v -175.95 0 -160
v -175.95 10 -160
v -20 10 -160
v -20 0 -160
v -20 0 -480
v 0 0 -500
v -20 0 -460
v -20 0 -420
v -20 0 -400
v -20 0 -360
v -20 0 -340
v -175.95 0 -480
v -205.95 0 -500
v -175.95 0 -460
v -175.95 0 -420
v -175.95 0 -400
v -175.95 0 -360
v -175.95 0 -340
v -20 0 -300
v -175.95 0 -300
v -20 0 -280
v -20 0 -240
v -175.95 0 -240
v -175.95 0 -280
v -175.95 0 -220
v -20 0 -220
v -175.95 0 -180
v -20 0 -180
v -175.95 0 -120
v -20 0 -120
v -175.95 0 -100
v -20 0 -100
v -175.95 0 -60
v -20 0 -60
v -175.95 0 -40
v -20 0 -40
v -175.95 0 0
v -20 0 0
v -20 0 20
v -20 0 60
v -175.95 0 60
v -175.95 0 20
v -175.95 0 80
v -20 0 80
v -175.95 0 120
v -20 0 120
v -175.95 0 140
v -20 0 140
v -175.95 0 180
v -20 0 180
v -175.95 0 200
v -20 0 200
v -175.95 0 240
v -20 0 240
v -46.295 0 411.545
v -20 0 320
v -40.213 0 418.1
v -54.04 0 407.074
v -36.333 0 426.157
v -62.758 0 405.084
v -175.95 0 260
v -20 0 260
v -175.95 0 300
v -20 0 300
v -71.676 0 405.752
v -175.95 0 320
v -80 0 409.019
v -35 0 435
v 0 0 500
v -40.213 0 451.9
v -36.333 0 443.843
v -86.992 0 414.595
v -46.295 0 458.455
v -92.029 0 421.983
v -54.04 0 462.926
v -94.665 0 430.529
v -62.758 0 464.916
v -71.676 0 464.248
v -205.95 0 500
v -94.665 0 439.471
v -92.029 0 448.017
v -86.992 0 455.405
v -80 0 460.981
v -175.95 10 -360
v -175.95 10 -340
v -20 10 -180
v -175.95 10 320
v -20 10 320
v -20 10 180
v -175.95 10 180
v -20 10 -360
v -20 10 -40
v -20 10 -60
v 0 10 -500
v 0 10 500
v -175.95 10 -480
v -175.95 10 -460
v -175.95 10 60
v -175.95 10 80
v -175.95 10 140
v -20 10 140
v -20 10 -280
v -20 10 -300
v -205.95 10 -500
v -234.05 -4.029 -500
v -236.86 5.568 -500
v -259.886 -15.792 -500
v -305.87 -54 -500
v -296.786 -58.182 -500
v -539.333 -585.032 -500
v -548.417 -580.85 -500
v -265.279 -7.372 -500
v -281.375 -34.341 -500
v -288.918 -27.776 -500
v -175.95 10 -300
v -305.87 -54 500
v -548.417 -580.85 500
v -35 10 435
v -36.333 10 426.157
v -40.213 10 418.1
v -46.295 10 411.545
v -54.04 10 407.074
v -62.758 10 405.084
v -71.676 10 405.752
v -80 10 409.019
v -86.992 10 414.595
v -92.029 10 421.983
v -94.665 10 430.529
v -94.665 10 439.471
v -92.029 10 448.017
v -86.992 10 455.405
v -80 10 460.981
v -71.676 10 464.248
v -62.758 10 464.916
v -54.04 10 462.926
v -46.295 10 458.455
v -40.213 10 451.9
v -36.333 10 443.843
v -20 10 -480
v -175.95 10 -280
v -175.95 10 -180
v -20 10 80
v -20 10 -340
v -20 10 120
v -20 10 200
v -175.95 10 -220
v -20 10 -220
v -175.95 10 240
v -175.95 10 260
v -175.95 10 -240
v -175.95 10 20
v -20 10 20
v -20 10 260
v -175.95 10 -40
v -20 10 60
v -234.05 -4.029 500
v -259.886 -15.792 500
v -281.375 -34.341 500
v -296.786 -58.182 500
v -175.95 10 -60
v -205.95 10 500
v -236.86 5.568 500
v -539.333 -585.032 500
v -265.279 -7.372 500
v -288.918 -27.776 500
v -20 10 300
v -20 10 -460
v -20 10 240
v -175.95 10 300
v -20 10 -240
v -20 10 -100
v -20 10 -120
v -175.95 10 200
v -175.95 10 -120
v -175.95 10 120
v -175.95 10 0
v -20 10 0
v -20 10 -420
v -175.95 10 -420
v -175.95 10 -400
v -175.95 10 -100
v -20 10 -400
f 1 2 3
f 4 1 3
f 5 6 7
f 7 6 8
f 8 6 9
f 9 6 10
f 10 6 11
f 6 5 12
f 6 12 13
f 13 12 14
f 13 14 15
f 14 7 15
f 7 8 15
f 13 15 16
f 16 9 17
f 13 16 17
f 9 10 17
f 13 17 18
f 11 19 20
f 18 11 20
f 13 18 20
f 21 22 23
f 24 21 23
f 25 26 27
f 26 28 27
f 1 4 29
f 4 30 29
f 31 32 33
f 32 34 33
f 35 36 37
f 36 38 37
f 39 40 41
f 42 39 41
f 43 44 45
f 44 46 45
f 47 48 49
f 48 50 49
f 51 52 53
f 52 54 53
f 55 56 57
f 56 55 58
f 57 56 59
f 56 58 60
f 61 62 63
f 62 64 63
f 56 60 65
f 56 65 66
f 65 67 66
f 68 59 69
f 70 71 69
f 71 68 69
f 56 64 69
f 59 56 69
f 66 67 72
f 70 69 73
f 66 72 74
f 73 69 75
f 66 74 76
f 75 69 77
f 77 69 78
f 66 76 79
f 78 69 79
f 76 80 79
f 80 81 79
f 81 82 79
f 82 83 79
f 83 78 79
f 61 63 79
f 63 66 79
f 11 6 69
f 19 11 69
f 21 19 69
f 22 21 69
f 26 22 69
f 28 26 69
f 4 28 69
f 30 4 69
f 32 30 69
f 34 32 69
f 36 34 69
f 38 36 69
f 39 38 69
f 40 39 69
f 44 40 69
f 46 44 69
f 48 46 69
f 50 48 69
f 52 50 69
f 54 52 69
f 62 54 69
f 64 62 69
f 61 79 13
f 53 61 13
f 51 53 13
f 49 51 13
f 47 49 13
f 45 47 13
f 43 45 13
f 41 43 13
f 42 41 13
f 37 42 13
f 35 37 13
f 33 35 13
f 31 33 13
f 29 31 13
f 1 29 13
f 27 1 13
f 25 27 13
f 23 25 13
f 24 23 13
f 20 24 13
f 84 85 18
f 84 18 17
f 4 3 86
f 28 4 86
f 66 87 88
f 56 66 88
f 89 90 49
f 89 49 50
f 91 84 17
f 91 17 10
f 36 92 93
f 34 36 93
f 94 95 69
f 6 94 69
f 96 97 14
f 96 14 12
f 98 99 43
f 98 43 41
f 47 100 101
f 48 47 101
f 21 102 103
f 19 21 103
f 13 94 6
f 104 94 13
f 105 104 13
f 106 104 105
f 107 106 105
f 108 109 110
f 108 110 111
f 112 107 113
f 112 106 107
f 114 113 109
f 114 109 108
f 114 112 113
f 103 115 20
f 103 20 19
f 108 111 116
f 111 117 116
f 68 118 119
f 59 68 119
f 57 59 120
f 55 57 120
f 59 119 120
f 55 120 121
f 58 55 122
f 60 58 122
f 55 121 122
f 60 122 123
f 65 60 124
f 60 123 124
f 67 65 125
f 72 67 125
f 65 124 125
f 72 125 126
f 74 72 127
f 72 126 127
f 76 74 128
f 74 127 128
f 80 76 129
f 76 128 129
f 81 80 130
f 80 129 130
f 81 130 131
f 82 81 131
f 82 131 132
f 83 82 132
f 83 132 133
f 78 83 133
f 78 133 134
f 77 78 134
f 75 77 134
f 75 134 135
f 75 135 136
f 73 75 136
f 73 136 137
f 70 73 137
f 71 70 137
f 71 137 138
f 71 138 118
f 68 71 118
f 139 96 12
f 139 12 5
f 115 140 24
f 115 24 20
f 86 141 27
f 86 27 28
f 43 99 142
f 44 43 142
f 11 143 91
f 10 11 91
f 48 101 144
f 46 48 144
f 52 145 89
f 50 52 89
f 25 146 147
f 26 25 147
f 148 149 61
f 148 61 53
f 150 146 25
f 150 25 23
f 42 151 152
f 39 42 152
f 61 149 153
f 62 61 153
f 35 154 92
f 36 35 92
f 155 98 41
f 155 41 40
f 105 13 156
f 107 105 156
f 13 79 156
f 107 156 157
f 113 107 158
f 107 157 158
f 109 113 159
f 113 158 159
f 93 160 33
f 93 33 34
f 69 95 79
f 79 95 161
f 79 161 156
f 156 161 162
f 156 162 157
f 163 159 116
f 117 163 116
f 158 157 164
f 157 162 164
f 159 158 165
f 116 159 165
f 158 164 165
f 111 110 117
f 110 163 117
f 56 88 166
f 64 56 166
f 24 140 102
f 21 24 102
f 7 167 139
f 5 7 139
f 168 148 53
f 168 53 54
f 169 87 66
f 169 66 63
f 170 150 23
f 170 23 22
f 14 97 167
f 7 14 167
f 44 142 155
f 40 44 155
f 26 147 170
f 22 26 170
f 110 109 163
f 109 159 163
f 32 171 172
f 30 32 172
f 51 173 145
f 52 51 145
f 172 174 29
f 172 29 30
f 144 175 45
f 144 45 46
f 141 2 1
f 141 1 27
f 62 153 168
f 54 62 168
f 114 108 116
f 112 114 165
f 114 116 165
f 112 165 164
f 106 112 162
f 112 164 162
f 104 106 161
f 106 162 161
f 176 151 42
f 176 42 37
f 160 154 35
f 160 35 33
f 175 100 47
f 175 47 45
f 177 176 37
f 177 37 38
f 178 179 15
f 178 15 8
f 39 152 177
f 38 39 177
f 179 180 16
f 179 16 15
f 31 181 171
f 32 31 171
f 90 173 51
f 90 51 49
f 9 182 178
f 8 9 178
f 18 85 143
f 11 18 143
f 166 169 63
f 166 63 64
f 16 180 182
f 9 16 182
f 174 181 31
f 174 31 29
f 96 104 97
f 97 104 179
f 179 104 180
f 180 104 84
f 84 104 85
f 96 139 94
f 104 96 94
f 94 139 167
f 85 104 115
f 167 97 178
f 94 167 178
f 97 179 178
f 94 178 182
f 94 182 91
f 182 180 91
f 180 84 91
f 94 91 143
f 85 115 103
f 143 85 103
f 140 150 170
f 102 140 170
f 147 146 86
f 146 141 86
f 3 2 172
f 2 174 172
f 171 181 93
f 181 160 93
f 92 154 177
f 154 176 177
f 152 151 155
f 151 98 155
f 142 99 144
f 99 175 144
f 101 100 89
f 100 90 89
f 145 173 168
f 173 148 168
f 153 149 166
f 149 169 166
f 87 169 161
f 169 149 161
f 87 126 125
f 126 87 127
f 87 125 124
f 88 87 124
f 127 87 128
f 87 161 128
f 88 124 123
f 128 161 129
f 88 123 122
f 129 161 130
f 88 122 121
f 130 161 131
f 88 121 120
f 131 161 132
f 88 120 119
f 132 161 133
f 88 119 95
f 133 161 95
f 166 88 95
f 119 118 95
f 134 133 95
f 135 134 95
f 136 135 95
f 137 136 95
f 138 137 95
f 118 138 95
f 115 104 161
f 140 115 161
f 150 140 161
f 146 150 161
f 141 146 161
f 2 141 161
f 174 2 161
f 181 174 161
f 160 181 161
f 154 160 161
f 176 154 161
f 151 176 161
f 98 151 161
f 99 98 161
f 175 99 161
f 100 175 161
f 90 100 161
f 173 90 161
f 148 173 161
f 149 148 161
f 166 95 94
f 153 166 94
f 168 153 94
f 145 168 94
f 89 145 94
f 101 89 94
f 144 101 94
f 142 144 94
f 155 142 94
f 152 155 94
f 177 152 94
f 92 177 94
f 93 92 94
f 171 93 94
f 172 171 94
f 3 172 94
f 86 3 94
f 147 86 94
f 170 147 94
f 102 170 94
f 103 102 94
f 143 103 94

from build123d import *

# Parameters (mm, degrees)
EXTRUDE_THIN1_DEPTH = 500
SKETCH2_W           = 155.95
SKETCH2_H           = 20
CUT_EXTRUDE1_DEPTH  = 596.0316925
LPATTERN1_COUNT     = 14
LPATTERN1_PITCH     = 60
SKETCH3_R           = 30
CUT_EXTRUDE2_DEPTH  = 596.0316925


with BuildPart() as part:
    # Sketch1 → Extrude-Thin1 (new body, symmetric)
    with BuildSketch(Plane.XY):
        with BuildLine():
            Line((0, 0), (-205.95, 0))
            ThreePointArc((-205.95, 0), (-259.885879639, -15.792394123), (-296.786225905, -58.181582248))
            Line((-296.786225905, -58.181582248), (-539.333048865, -585.0316925))
            Line((-539.333048865, -585.0316925), (-548.416671455, -580.849850725))
            Line((-548.416671455, -580.849850725), (-305.869848496, -53.999740473))
            ThreePointArc((-305.869848496, -53.999740473), (-265.279467603, -7.371633535), (-205.95, 10))
            Line((-205.95, 10), (0, 10))
            Line((0, 10), (0, 0))
        make_face()
    extrude(amount=EXTRUDE_THIN1_DEPTH, both=True)

    # Sketch2 → Cut-Extrude1 (cut, through all)
    with BuildSketch(Plane(origin=(0, 10, 0), x_dir=(1, 0, 0), z_dir=(0, 1, 0))):
        with Locations((-97.975, 470)):
            Rectangle(SKETCH2_W, SKETCH2_H)
    cut_extrude1 = extrude(amount=-CUT_EXTRUDE1_DEPTH, mode=Mode.SUBTRACT)

    # LPattern1: Cut-Extrude1 ×14
    with Locations(*[(0, 0, i * LPATTERN1_PITCH) for i in range(1, LPATTERN1_COUNT)]):
        add(cut_extrude1, mode=Mode.SUBTRACT)

    # Sketch3 → Cut-Extrude2 (cut, through all)
    with BuildSketch(Plane(origin=(0, 10, 0), x_dir=(1, 0, 0), z_dir=(0, 1, 0))):
        with Locations((-65, -435)):
            Circle(SKETCH3_R)
    extrude(amount=-CUT_EXTRUDE2_DEPTH, mode=Mode.SUBTRACT)


solid = part.part
